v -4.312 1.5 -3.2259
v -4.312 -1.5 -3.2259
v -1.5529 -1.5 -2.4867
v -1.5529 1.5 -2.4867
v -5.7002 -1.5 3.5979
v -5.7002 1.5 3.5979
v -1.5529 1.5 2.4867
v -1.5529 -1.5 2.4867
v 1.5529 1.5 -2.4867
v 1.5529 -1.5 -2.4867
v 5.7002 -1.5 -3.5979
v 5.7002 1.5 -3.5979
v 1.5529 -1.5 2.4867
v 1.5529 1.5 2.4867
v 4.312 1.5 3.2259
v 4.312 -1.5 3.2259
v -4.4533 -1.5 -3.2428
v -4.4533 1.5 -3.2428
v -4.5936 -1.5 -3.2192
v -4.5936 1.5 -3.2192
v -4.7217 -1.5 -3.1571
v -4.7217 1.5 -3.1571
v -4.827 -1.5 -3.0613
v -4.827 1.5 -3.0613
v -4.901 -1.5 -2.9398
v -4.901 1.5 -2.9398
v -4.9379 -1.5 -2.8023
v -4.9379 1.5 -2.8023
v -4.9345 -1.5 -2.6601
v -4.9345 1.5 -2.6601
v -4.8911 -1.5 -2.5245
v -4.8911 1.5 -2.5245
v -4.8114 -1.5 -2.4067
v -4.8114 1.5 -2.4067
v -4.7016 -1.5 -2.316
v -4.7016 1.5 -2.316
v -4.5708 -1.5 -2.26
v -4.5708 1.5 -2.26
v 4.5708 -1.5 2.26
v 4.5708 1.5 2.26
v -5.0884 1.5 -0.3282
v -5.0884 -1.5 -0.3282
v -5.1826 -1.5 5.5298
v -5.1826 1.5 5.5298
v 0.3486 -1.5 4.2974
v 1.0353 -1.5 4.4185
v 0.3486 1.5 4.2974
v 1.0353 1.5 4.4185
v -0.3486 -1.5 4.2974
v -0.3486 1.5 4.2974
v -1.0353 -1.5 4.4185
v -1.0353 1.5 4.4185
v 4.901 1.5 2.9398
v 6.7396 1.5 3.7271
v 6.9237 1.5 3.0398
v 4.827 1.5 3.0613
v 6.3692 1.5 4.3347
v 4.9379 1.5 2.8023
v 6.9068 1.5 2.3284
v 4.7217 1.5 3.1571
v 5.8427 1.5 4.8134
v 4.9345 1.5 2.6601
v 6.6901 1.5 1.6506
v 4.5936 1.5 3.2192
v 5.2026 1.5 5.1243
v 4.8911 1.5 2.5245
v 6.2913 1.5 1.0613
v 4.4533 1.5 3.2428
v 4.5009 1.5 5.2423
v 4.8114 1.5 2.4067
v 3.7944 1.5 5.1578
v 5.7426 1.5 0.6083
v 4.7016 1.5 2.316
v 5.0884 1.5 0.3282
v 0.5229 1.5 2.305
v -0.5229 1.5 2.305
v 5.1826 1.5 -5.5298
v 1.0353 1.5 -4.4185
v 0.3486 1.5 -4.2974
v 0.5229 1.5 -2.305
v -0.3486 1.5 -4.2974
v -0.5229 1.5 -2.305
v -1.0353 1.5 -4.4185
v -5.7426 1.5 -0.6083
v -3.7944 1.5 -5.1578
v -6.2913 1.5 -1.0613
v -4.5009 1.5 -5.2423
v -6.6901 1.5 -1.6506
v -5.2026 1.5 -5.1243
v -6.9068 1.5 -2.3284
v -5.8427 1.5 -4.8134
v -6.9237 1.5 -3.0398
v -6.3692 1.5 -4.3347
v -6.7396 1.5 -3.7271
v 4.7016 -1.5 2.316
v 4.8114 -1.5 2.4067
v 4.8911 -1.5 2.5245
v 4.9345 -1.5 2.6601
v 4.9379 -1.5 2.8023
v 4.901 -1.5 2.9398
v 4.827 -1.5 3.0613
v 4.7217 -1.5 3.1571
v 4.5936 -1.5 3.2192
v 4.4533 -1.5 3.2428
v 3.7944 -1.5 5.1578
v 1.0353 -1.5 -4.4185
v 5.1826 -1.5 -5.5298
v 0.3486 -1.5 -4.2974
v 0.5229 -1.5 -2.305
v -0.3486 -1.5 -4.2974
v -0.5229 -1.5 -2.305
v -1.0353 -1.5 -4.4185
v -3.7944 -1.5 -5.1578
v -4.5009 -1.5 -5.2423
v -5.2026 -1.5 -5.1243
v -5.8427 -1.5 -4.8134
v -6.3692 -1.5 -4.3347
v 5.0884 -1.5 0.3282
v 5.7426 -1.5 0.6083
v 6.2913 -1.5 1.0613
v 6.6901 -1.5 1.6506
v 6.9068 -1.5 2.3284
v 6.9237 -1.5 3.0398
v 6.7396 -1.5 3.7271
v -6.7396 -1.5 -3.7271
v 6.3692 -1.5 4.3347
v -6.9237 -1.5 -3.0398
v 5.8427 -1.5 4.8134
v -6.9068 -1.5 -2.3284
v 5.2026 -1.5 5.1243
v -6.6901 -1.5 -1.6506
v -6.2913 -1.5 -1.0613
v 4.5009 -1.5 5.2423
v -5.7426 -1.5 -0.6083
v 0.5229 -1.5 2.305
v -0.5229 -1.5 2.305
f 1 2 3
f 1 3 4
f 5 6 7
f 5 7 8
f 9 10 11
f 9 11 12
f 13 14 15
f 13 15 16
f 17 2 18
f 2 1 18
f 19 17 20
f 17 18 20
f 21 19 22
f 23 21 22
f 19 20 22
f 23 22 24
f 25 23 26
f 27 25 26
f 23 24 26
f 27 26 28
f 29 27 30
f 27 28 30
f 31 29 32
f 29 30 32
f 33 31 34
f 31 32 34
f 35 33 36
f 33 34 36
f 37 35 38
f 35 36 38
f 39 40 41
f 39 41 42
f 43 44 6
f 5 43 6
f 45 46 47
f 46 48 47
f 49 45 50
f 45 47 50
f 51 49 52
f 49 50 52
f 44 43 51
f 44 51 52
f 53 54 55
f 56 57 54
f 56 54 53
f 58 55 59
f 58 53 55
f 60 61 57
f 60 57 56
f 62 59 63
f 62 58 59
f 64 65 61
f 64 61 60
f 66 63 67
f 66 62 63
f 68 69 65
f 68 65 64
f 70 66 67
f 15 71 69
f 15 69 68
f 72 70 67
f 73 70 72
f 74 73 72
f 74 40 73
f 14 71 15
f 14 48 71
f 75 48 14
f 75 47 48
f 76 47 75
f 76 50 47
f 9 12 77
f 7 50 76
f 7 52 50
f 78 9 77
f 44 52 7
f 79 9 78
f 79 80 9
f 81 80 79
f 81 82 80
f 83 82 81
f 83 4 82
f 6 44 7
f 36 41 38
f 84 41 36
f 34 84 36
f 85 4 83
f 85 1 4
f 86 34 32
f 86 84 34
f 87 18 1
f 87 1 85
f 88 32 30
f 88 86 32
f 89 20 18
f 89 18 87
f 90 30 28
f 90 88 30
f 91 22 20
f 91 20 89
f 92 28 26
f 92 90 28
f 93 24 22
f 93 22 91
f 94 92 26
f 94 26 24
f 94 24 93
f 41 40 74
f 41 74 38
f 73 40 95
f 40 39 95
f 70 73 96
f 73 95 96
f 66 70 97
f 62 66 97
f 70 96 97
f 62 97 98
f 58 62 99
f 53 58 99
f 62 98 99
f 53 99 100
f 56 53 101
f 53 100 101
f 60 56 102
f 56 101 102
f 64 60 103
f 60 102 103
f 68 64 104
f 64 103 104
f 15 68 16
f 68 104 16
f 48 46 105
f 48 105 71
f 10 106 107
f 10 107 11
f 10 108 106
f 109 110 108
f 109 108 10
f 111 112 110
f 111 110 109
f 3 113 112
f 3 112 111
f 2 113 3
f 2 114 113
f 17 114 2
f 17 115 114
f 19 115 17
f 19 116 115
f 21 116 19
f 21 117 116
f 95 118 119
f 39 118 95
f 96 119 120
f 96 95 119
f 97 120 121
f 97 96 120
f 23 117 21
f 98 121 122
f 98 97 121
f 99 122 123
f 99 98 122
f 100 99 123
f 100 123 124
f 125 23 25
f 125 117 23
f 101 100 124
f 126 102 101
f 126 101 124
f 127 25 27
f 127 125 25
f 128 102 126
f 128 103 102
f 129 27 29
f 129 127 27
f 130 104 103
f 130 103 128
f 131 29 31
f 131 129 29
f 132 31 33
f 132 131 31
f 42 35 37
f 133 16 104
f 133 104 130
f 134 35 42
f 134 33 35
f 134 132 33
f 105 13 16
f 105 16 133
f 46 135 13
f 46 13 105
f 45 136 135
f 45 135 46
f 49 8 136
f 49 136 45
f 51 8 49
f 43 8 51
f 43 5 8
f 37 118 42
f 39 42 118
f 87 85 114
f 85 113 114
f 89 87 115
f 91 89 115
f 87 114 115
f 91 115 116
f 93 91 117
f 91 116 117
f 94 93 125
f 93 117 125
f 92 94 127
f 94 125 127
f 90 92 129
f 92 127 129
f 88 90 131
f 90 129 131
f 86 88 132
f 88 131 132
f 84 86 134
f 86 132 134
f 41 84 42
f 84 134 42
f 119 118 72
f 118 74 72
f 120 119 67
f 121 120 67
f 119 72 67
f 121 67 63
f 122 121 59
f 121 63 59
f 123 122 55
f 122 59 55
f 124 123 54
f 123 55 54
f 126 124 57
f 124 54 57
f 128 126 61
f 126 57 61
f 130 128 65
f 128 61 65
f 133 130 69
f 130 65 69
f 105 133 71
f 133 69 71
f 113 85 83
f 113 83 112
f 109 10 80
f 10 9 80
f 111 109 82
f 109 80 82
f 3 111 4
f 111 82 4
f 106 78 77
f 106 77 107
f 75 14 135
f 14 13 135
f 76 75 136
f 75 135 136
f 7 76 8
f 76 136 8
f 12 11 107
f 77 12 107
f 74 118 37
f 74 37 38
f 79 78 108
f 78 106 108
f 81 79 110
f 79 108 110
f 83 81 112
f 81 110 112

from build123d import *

# Parameters (mm, degrees)
SKETCH2_W = 2
SKETCH2_H = 3


with BuildPart() as part:
    # Sweep1: sweep along a path in Sketch1
    with BuildLine(Plane(origin=(0, 0, 0), x_dir=(1, 0, 0), z_dir=(0, 1, 0))) as sweep1_path:
        Line((5.441400564, 4.563847428), (1.294095226, 3.452580312))
        ThreePointArc((1.294095226, 3.452580312), (0, 3.282209443), (-1.294095226, 3.452580312))
        Line((-1.294095226, 3.452580312), (-4.053171996, 4.191872704))
        ThreePointArc((-4.053171996, 4.191872704), (-5.890289303, 3.131212533), (-4.829629131, 1.294095226))
        Line((-4.829629131, 1.294095226), (4.829629131, -1.294095226))
        ThreePointArc((4.829629131, -1.294095226), (5.890289303, -3.131212533), (4.053171996, -4.191872704))
        Line((4.053171996, -4.191872704), (1.294095226, -3.452580312))
        ThreePointArc((1.294095226, -3.452580312), (0, -3.282209443), (-1.294095226, -3.452580312))
        Line((-1.294095226, -3.452580312), (-5.441400564, -4.563847428))
    # Sketch2 → Sweep1 (sweep)
    with BuildSketch(Plane(origin=(-5.441400564, 0, 4.563847428), x_dir=(0.2588190451025149, 0, 0.96592582628907), z_dir=(-0.96592582628907, 0, 0.2588190451025149))):
        Rectangle(SKETCH2_W, SKETCH2_H)
    sweep(path=sweep1_path.line)


solid = part.part
